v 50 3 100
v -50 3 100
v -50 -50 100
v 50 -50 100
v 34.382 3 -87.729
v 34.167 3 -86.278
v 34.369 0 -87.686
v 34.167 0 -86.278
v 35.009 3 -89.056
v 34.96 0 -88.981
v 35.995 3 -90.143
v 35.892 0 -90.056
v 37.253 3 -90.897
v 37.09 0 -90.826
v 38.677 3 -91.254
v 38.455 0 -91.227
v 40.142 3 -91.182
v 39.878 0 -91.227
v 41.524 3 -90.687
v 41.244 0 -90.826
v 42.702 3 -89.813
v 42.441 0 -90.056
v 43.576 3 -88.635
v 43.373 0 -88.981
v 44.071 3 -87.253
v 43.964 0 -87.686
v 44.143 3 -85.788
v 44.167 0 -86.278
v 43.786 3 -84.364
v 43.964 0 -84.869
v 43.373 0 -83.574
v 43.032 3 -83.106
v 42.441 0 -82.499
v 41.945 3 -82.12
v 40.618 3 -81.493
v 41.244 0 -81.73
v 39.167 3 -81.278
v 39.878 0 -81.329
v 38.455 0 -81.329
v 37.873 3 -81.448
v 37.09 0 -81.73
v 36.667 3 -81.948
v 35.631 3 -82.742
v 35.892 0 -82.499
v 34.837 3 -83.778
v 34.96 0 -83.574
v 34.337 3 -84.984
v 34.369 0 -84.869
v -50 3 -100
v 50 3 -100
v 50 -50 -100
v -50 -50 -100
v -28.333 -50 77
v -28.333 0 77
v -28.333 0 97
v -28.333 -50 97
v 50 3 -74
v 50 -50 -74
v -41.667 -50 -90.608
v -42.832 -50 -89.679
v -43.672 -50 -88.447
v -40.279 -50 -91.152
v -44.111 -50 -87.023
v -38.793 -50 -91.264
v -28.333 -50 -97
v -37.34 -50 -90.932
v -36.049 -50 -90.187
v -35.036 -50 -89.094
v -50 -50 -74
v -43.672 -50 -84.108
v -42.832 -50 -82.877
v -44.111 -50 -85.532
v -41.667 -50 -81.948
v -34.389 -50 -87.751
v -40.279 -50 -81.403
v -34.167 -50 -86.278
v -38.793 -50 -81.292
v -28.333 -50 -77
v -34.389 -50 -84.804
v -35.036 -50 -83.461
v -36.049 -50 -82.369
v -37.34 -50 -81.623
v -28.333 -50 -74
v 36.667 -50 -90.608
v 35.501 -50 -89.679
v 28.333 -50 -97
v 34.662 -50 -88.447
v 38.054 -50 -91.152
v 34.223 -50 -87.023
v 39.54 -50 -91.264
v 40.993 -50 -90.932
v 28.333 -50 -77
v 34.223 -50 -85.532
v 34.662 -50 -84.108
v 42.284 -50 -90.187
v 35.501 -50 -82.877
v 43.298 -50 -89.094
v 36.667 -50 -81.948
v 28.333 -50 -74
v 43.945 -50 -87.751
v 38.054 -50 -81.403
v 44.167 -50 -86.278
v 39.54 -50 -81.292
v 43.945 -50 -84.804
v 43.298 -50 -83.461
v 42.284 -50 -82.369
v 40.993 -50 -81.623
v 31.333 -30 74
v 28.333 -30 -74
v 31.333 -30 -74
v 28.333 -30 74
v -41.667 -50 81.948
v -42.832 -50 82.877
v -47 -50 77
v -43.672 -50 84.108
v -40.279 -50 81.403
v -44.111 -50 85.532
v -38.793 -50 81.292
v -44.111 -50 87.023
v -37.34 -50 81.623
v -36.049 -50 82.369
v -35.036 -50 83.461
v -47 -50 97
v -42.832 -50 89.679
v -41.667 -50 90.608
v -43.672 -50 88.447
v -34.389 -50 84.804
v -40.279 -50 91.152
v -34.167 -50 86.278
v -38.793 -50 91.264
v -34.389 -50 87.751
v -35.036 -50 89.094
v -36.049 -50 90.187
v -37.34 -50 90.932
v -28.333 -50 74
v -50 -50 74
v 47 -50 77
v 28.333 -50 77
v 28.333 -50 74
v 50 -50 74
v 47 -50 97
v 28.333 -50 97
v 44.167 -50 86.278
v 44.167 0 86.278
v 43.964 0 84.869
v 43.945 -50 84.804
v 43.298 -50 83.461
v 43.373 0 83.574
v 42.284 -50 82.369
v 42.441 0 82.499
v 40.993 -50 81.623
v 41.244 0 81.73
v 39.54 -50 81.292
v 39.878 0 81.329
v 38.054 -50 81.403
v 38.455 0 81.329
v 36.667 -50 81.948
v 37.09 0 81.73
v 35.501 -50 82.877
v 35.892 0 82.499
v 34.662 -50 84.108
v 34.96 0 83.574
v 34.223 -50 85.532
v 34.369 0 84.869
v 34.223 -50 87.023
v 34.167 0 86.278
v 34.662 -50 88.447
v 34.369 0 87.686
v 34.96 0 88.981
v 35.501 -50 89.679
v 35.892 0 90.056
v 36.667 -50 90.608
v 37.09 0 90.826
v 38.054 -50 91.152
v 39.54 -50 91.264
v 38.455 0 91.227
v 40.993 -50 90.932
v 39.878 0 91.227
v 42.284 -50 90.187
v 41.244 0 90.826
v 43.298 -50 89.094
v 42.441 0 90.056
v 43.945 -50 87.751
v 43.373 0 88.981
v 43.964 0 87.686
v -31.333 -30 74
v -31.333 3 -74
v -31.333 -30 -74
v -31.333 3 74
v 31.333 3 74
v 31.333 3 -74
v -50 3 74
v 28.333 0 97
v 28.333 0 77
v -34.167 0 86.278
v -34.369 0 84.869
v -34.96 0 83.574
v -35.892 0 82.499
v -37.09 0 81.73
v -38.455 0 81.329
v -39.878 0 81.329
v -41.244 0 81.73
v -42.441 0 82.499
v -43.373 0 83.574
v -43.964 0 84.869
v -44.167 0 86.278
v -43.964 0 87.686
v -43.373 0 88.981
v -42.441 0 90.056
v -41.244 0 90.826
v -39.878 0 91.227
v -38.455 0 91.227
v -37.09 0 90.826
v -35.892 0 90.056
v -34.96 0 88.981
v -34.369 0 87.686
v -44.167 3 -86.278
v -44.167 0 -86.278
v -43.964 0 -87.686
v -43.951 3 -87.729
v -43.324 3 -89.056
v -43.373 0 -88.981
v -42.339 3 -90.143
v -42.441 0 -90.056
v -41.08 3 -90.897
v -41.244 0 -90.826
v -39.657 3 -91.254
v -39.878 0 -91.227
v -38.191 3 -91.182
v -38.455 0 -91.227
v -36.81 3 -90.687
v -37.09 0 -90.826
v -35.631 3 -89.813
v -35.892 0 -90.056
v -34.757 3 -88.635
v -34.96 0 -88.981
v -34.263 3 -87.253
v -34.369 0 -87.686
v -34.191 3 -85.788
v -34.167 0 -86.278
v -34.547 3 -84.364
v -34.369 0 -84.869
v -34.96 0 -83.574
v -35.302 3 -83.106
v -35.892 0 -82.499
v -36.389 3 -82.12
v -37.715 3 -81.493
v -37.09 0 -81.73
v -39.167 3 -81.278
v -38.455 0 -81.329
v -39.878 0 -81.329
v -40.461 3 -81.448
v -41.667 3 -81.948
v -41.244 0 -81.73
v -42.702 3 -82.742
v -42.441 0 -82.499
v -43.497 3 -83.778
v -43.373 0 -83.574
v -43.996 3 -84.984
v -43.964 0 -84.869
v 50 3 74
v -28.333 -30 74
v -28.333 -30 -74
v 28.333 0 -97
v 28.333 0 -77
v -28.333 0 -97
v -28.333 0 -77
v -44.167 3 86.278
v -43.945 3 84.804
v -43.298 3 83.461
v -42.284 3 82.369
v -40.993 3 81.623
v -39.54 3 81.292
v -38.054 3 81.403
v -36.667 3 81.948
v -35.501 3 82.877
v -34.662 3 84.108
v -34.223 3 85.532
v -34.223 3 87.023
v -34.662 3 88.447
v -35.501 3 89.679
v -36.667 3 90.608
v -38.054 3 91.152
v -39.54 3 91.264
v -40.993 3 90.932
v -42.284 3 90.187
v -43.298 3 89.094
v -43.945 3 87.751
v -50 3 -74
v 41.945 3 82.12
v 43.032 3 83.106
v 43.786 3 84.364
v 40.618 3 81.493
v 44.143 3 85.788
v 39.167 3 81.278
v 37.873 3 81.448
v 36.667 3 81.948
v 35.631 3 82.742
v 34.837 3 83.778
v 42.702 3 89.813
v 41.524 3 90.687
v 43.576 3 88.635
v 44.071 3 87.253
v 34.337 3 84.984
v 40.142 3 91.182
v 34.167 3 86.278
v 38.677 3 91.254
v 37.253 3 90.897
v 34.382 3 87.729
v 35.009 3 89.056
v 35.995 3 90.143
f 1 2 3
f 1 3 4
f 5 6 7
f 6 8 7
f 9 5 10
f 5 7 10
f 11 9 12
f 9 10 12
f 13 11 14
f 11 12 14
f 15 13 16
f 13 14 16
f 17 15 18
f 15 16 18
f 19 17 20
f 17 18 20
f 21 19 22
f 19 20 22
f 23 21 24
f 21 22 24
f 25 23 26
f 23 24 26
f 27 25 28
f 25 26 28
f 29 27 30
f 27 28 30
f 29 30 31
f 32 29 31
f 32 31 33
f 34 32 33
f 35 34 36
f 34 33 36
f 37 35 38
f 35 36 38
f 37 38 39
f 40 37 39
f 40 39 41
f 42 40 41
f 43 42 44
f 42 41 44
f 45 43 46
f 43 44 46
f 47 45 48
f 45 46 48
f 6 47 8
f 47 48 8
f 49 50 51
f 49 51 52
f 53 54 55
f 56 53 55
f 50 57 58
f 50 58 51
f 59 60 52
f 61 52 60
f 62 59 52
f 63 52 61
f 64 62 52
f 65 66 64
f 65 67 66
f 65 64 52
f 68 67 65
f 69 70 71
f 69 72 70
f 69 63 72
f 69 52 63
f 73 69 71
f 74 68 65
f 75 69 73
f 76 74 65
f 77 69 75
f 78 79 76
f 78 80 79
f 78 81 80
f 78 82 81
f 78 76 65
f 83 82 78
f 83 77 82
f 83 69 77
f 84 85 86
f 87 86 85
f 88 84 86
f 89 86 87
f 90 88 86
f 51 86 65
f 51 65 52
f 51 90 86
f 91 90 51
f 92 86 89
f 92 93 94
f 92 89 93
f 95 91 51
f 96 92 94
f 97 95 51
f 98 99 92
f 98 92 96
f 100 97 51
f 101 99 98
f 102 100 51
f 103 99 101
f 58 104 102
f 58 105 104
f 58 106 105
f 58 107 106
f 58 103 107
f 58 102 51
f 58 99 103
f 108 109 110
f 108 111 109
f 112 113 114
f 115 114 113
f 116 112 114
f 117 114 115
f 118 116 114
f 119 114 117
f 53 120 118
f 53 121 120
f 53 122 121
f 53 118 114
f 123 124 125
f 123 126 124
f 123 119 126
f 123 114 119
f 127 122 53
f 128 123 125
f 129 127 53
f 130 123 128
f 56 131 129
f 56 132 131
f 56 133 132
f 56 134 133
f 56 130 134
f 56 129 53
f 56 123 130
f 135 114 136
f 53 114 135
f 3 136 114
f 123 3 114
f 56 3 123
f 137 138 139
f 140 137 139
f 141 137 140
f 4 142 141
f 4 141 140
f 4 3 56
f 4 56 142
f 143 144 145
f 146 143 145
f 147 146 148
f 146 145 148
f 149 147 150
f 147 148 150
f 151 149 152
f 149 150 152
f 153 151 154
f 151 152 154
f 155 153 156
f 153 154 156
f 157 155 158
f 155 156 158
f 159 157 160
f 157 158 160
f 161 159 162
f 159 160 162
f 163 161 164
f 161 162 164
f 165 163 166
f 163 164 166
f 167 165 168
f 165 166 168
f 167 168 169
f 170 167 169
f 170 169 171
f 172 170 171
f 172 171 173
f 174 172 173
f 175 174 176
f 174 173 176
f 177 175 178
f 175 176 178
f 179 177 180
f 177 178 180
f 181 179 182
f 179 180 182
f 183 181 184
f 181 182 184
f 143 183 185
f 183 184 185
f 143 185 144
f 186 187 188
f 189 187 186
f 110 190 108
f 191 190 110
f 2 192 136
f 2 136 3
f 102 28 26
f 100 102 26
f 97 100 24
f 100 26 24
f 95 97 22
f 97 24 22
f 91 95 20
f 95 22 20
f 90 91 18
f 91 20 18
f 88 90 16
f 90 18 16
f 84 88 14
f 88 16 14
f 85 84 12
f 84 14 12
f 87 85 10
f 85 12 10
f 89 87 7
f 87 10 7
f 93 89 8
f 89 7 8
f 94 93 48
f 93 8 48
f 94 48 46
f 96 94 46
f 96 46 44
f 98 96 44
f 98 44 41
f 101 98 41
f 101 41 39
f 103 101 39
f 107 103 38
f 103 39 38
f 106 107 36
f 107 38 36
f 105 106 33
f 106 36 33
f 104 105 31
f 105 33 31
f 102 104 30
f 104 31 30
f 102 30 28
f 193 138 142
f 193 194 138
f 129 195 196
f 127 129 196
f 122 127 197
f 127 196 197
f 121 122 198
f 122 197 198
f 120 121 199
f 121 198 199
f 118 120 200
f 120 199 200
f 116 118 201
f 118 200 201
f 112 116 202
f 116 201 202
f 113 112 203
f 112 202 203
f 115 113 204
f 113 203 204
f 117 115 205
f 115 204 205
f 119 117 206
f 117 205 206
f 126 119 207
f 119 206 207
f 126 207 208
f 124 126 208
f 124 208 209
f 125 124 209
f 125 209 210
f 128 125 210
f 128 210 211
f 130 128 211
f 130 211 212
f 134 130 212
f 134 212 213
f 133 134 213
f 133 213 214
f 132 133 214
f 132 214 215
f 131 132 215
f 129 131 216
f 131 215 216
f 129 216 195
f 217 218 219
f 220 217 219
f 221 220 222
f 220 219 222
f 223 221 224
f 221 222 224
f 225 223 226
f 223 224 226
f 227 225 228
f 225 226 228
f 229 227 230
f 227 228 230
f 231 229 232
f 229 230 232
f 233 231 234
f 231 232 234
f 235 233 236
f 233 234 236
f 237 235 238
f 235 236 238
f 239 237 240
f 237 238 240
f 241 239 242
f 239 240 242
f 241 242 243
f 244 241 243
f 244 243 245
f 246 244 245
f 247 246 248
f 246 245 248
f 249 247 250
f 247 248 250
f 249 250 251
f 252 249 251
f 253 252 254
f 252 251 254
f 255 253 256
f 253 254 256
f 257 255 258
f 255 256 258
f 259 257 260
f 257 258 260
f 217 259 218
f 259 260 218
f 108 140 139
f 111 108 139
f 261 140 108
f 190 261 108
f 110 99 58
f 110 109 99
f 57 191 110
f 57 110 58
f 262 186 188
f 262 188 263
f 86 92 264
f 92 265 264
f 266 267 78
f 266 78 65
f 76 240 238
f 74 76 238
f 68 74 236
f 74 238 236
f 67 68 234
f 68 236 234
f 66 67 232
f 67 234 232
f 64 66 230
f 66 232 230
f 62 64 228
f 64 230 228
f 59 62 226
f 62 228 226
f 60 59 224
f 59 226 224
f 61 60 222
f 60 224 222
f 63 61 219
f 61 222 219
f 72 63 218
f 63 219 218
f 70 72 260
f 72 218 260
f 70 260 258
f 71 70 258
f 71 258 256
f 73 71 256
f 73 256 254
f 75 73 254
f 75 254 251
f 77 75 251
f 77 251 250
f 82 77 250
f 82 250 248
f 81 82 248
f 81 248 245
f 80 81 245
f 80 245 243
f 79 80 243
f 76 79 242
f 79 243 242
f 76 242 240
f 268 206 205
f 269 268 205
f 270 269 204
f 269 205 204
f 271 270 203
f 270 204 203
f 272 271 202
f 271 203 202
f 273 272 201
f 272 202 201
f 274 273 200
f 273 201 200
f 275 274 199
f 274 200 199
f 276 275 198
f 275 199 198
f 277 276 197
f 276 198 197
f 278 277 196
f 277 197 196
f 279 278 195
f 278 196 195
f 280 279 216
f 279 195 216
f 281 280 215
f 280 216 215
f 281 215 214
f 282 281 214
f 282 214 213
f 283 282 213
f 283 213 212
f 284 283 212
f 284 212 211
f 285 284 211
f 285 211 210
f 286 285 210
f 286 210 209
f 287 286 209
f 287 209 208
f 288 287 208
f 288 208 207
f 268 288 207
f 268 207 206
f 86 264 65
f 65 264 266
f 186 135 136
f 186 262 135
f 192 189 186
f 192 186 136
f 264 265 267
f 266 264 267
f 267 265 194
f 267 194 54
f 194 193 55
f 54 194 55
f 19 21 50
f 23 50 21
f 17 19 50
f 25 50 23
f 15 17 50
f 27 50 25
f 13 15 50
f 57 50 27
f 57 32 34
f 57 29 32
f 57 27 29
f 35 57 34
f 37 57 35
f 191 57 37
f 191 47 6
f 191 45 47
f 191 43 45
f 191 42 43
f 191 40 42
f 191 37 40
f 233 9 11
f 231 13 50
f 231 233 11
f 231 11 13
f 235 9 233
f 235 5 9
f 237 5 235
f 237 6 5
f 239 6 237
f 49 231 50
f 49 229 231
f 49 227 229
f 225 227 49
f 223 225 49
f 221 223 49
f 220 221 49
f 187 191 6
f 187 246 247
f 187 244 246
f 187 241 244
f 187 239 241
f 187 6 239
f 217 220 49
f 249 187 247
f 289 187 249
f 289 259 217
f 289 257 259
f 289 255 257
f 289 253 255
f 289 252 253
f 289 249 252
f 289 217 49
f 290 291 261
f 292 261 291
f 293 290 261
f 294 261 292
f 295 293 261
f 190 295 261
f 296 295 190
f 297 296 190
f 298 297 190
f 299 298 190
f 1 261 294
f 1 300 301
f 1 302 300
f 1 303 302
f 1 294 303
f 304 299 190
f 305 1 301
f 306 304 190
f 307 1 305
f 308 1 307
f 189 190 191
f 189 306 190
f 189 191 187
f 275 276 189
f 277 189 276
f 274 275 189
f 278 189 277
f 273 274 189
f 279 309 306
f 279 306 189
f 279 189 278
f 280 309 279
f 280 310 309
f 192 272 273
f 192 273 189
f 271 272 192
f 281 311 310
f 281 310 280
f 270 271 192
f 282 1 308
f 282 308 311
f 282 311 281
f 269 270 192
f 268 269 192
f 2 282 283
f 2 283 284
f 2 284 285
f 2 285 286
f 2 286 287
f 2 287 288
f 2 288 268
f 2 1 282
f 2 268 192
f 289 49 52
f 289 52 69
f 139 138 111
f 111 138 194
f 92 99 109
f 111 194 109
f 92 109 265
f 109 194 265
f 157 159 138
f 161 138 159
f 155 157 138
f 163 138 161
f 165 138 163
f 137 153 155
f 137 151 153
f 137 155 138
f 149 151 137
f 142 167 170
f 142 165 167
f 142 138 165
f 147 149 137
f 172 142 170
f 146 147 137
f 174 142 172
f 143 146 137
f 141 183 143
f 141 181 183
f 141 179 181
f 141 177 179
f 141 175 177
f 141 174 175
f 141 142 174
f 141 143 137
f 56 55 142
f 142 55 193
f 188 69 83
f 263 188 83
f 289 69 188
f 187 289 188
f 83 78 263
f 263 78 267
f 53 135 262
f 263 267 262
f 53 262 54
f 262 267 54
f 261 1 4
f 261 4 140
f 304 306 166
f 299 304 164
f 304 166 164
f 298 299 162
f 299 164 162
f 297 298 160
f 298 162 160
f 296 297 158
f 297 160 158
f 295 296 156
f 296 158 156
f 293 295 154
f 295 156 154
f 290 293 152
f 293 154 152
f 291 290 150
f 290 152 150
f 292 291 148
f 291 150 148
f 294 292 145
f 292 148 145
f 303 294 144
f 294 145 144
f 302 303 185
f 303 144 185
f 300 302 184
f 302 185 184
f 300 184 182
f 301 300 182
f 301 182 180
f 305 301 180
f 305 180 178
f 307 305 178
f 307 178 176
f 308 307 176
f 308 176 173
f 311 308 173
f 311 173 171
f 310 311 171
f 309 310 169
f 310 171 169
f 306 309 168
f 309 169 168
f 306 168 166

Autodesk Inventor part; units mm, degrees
ref_plane "YZ Plane" through (0, 0, 0) normal (1, 0, 0) x (0, 1, 0)
ref_plane "XZ Plane" through (0, 0, 0) normal (0, 1, 0) x (-1, 0, 0)
ref_plane "XY Plane" through (0, 0, 0) normal (0, 0, 1) x (1, 0, 0)
sketch "Sketch1" plane through (0, 0, 0) normal (0, 1, 0) x (-1, 0, 0)
  line L0 (50, 100) -> (-50, 100)
  line L1 (-50, 100) -> (-50, -100)
  line L2 (-50, -100) -> (50, -100)
  line L3 (50, -100) -> (50, 100)
  line L4 (50, 100) -> (-50, -100) construction
  line L5 (-50, 100) -> (50, -100) construction
  line L6 (-47, -97) -> (47, -97)
  line L7 (47, -97) -> (47, 97)
  line L8 (47, 97) -> (-47, 97)
  line L9 (-47, 97) -> (-47, -97)
  line L10 (-47, -97) -> (47, 97) construction
  line L11 (47, -97) -> (-47, 97) construction
  line L12 (50, 100) -> (50, 77)
  line L13 (50, 77) -> (-50, 77)
  line L14 (0, 0) -> (10.1877, 0)
  line L15 (50, -77) -> (-50, -77)
  line L16 (0, 0) -> (0, -5.3943)
  line L17 (0, 100) -> (0, -100)
  line L18 (47, 97) -> (31.3333, 97)
  circle A0 centre (39.1667, 86.2777) radius 5
  line L19 (39.1667, 86.2777) -> (47, 86.2777)
  line L20 (39.1667, 86.2777) -> (31.3333, 86.2777)
  line L21 (31.3333, 86.2777) -> (31.3333, 77)
  line L22 (31.3333, 97) -> (31.3333, 86.2777)
  line L23 (0, 0) -> (-10.1877, 0)
  circle A1 centre (-39.1667, 86.2777) radius 5
  line L24 (-31.3333, 86.2777) -> (-31.3333, 77)
  line L25 (-31.3333, 97) -> (-31.3333, 86.2777)
  circle A2 centre (39.1667, -86.2777) radius 5
  line L26 (31.3333, -86.2777) -> (31.3333, -77)
  line L27 (31.3333, -97) -> (31.3333, -86.2777)
  circle A3 centre (-39.1667, -86.2777) radius 5
  line L28 (-31.3333, -86.2777) -> (-31.3333, -77)
  line L29 (-31.3333, -97) -> (-31.3333, -86.2777)
  line L30 (-31.3333, 77) -> (-31.3333, -77)
  line L31 (31.3333, 77) -> (31.3333, -77)
  line L32 (39.1667, 86.2777) -> (39.1667, -86.2777)
  line L33 (-39.1667, 86.2777) -> (-39.1667, -86.2777)
  line L34 (50, 77) -> (50, 74)
  line L35 (50, 74) -> (31.3333, 74)
  line L36 (50, -77) -> (50, -74)
  line L37 (50, -74) -> (31.3333, -74)
  line L38 (-31.3333, 77) -> (-31.3333, 74)
  line L39 (-31.3333, 74) -> (-50, 74)
  line L40 (-50, -77) -> (-50, -74)
  line L41 (-50, -74) -> (-31.3333, -74)
  dimension "d0" = 100
  dimension "d1" = 200
  dimension "d2" = 94
  dimension "d3" = 194
  dimension "d4" = 23
  dimension "d6" = 10
  dimension "d7" = 7.8333
  dimension "d8" = 7.8333
  dimension "d11" = 3
  dimension "d12" = 3
  dimension "d13" = 3
  dimension "d14" = 3
extrude "Extrusion1" add sketch "Sketch1" along normal blind 3 contours L3 L13 L7 L8 L17 L0 | L17 L8 L9 L13 L1 L0 | L3 L35 L7 L13 | L17 L13 L24 L25 L8 | L8 L22 L21 L13 L17 | L13 L32 A0 L19 L7 | L7 L35 L32 L13 | L13 L9 L39 L1 | L8 L7 L19 A0 L20 L22 | L25 L24 L13 L9 L8 | L17 L16 L15 L30 L13 | L13 L31 L15 L17 L16 | L3 L15 L7 L37 | L32 L35 L31 L13 | L13 L21 L20 A0 L32 | L13 L33 L39 L9 | L30 L39 L33 L13 | L3 L2 L17 L6 L7 L15 | L7 L15 L32 L37 | L41 L9 L15 L1 | L7 L6 L27 L26 L15 | L32 L15 L31 L37 | L15 L9 L6 L17 L2 L1 | L41 L33 L15 L9 | L30 L15 L33 L41 | L17 L6 L29 L28 L15 | L15 L26 L27 L6 L17 | L15 L28 L29 L6 L9
sketch "Sketch2" plane through (0, 0, 0) normal (0, -1, 0) x (1, 0, 0)
  line L0 (50, -74) -> (50, -100) projected
  line L1 (31.3333, -74) -> (50, -74) projected
  line L2 (31.3333, 74) -> (31.3333, -74) projected
  line L3 (50, 74) -> (31.3333, 74) projected
  line L4 (50, 100) -> (50, 74) projected
  line L5 (-50, 100) -> (50, 100) projected
  line L6 (-50, 74) -> (-50, 100) projected
  line L7 (-31.3333, 74) -> (-50, 74) projected
  line L8 (-31.3333, -74) -> (-31.3333, 74) projected
  line L9 (-50, -74) -> (-31.3333, -74) projected
  line L10 (-50, -100) -> (-50, -74) projected
  line L11 (50, -100) -> (-50, -100) projected
  line L12 (28.3333, -77) -> (47, -77)
  line L13 (47, -77) -> (47, -97)
  line L14 (47, -97) -> (-47, -97)
  line L15 (-47, -97) -> (-47, -77)
  line L16 (-47, -77) -> (-28.3333, -77)
  line L17 (-28.3333, -77) -> (-28.3333, 77)
  line L18 (-28.3333, 77) -> (-47, 77)
  line L19 (-47, 77) -> (-47, 97)
  line L20 (-47, 97) -> (47, 97)
  line L21 (47, 97) -> (47, 77)
  line L22 (47, 77) -> (28.3333, 77)
  line L23 (28.3333, 77) -> (28.3333, -77)
  point P0 (0, 0)
  dimension "d15" = 3
extrude "Extrusion2" add sketch "Sketch2" along normal blind 30
sketch "Sketch3" plane through (0, -30, 0) normal (0, -1, 0) x (1, 0, 0)
  line L0 (31.3333, 74) -> (50, 74) projected
  line L1 (50, 74) -> (50, 100) projected
  line L2 (50, 100) -> (-50, 100) projected
  line L3 (-50, 100) -> (-50, 74) projected
  line L4 (-50, 74) -> (-31.3333, 74) projected
  line L5 (-31.3333, -74) -> (-50, -74) projected
  line L6 (-50, -74) -> (-50, -100) projected
  line L7 (-50, -100) -> (50, -100) projected
  line L8 (50, -100) -> (50, -74) projected
  line L9 (50, -74) -> (31.3333, -74) projected
  line L10 (28.3333, -77) -> (47, -77) projected
  line L11 (47, -77) -> (47, -97) projected
  line L12 (47, -97) -> (-47, -97) projected
  line L13 (-47, -97) -> (-47, -77) projected
  line L14 (-47, -77) -> (-28.3333, -77) projected
  line L15 (-28.3333, -77) -> (-28.3333, 77) projected
  line L16 (-28.3333, 77) -> (-47, 77) projected
  line L17 (-47, 77) -> (-47, 97) projected
  line L18 (-47, 97) -> (47, 97) projected
  line L19 (47, 97) -> (47, 77) projected
  line L20 (47, 77) -> (28.3333, 77) projected
  line L21 (28.3333, 77) -> (28.3333, -77) projected
  line L22 (31.3333, 74) -> (-50, 74)
  line L23 (31.3333, -74) -> (-50, -74)
  point P0 (0, 0)
  point P1 (28.3333, -74)
  point P2 (-28.3333, -74)
  point P3 (-28.3333, 74)
  point P4 (28.3333, 74)
extrude "Extrusion3" add sketch "Sketch3" along normal blind 20 contours L22 L21 L20 L19 L18 L17 L16 L15 L4 L3 L2 L1 L0 | L23 L9 L8 L7 L6 L5 L15 L14 L13 L12 L11 L10 L21
sketch "Sketch4" plane through (0, 0, 0) normal (0, -1, 0) x (1, 0, 0)
  line L0 (28.3333, 77) -> (47, 77) projected
  line L1 (47, 77) -> (47, 97) projected
  line L2 (47, 97) -> (-47, 97) projected
  line L3 (-47, 97) -> (-47, 77) projected
  line L4 (-47, 77) -> (-28.3333, 77) projected
  line L5 (-28.3333, -77) -> (-47, -77) projected
  line L6 (-47, -77) -> (-47, -97) projected
  line L7 (-47, -97) -> (47, -97) projected
  line L8 (47, -97) -> (47, -77) projected
  line L9 (47, -77) -> (28.3333, -77) projected
  circle A0 centre (39.1667, -86.2777) radius 5 projected
  circle A1 centre (39.1667, 86.2777) radius 5 projected
  circle A2 centre (-39.1667, -86.2777) radius 5 projected
  circle A3 centre (-39.1667, 86.2777) radius 5 projected
  line L10 (28.3333, 77) -> (28.3333, 97)
  line L11 (-28.3333, 77) -> (-28.3333, 97)
  line L12 (-28.3333, -77) -> (-28.3333, -97)
  line L13 (28.3333, -77) -> (28.3333, -97)
  point P0 (0, 0)
extrude "Extrusion4" add sketch "Sketch4" along normal up to surface (50 mm away)
properties part number "atas"
